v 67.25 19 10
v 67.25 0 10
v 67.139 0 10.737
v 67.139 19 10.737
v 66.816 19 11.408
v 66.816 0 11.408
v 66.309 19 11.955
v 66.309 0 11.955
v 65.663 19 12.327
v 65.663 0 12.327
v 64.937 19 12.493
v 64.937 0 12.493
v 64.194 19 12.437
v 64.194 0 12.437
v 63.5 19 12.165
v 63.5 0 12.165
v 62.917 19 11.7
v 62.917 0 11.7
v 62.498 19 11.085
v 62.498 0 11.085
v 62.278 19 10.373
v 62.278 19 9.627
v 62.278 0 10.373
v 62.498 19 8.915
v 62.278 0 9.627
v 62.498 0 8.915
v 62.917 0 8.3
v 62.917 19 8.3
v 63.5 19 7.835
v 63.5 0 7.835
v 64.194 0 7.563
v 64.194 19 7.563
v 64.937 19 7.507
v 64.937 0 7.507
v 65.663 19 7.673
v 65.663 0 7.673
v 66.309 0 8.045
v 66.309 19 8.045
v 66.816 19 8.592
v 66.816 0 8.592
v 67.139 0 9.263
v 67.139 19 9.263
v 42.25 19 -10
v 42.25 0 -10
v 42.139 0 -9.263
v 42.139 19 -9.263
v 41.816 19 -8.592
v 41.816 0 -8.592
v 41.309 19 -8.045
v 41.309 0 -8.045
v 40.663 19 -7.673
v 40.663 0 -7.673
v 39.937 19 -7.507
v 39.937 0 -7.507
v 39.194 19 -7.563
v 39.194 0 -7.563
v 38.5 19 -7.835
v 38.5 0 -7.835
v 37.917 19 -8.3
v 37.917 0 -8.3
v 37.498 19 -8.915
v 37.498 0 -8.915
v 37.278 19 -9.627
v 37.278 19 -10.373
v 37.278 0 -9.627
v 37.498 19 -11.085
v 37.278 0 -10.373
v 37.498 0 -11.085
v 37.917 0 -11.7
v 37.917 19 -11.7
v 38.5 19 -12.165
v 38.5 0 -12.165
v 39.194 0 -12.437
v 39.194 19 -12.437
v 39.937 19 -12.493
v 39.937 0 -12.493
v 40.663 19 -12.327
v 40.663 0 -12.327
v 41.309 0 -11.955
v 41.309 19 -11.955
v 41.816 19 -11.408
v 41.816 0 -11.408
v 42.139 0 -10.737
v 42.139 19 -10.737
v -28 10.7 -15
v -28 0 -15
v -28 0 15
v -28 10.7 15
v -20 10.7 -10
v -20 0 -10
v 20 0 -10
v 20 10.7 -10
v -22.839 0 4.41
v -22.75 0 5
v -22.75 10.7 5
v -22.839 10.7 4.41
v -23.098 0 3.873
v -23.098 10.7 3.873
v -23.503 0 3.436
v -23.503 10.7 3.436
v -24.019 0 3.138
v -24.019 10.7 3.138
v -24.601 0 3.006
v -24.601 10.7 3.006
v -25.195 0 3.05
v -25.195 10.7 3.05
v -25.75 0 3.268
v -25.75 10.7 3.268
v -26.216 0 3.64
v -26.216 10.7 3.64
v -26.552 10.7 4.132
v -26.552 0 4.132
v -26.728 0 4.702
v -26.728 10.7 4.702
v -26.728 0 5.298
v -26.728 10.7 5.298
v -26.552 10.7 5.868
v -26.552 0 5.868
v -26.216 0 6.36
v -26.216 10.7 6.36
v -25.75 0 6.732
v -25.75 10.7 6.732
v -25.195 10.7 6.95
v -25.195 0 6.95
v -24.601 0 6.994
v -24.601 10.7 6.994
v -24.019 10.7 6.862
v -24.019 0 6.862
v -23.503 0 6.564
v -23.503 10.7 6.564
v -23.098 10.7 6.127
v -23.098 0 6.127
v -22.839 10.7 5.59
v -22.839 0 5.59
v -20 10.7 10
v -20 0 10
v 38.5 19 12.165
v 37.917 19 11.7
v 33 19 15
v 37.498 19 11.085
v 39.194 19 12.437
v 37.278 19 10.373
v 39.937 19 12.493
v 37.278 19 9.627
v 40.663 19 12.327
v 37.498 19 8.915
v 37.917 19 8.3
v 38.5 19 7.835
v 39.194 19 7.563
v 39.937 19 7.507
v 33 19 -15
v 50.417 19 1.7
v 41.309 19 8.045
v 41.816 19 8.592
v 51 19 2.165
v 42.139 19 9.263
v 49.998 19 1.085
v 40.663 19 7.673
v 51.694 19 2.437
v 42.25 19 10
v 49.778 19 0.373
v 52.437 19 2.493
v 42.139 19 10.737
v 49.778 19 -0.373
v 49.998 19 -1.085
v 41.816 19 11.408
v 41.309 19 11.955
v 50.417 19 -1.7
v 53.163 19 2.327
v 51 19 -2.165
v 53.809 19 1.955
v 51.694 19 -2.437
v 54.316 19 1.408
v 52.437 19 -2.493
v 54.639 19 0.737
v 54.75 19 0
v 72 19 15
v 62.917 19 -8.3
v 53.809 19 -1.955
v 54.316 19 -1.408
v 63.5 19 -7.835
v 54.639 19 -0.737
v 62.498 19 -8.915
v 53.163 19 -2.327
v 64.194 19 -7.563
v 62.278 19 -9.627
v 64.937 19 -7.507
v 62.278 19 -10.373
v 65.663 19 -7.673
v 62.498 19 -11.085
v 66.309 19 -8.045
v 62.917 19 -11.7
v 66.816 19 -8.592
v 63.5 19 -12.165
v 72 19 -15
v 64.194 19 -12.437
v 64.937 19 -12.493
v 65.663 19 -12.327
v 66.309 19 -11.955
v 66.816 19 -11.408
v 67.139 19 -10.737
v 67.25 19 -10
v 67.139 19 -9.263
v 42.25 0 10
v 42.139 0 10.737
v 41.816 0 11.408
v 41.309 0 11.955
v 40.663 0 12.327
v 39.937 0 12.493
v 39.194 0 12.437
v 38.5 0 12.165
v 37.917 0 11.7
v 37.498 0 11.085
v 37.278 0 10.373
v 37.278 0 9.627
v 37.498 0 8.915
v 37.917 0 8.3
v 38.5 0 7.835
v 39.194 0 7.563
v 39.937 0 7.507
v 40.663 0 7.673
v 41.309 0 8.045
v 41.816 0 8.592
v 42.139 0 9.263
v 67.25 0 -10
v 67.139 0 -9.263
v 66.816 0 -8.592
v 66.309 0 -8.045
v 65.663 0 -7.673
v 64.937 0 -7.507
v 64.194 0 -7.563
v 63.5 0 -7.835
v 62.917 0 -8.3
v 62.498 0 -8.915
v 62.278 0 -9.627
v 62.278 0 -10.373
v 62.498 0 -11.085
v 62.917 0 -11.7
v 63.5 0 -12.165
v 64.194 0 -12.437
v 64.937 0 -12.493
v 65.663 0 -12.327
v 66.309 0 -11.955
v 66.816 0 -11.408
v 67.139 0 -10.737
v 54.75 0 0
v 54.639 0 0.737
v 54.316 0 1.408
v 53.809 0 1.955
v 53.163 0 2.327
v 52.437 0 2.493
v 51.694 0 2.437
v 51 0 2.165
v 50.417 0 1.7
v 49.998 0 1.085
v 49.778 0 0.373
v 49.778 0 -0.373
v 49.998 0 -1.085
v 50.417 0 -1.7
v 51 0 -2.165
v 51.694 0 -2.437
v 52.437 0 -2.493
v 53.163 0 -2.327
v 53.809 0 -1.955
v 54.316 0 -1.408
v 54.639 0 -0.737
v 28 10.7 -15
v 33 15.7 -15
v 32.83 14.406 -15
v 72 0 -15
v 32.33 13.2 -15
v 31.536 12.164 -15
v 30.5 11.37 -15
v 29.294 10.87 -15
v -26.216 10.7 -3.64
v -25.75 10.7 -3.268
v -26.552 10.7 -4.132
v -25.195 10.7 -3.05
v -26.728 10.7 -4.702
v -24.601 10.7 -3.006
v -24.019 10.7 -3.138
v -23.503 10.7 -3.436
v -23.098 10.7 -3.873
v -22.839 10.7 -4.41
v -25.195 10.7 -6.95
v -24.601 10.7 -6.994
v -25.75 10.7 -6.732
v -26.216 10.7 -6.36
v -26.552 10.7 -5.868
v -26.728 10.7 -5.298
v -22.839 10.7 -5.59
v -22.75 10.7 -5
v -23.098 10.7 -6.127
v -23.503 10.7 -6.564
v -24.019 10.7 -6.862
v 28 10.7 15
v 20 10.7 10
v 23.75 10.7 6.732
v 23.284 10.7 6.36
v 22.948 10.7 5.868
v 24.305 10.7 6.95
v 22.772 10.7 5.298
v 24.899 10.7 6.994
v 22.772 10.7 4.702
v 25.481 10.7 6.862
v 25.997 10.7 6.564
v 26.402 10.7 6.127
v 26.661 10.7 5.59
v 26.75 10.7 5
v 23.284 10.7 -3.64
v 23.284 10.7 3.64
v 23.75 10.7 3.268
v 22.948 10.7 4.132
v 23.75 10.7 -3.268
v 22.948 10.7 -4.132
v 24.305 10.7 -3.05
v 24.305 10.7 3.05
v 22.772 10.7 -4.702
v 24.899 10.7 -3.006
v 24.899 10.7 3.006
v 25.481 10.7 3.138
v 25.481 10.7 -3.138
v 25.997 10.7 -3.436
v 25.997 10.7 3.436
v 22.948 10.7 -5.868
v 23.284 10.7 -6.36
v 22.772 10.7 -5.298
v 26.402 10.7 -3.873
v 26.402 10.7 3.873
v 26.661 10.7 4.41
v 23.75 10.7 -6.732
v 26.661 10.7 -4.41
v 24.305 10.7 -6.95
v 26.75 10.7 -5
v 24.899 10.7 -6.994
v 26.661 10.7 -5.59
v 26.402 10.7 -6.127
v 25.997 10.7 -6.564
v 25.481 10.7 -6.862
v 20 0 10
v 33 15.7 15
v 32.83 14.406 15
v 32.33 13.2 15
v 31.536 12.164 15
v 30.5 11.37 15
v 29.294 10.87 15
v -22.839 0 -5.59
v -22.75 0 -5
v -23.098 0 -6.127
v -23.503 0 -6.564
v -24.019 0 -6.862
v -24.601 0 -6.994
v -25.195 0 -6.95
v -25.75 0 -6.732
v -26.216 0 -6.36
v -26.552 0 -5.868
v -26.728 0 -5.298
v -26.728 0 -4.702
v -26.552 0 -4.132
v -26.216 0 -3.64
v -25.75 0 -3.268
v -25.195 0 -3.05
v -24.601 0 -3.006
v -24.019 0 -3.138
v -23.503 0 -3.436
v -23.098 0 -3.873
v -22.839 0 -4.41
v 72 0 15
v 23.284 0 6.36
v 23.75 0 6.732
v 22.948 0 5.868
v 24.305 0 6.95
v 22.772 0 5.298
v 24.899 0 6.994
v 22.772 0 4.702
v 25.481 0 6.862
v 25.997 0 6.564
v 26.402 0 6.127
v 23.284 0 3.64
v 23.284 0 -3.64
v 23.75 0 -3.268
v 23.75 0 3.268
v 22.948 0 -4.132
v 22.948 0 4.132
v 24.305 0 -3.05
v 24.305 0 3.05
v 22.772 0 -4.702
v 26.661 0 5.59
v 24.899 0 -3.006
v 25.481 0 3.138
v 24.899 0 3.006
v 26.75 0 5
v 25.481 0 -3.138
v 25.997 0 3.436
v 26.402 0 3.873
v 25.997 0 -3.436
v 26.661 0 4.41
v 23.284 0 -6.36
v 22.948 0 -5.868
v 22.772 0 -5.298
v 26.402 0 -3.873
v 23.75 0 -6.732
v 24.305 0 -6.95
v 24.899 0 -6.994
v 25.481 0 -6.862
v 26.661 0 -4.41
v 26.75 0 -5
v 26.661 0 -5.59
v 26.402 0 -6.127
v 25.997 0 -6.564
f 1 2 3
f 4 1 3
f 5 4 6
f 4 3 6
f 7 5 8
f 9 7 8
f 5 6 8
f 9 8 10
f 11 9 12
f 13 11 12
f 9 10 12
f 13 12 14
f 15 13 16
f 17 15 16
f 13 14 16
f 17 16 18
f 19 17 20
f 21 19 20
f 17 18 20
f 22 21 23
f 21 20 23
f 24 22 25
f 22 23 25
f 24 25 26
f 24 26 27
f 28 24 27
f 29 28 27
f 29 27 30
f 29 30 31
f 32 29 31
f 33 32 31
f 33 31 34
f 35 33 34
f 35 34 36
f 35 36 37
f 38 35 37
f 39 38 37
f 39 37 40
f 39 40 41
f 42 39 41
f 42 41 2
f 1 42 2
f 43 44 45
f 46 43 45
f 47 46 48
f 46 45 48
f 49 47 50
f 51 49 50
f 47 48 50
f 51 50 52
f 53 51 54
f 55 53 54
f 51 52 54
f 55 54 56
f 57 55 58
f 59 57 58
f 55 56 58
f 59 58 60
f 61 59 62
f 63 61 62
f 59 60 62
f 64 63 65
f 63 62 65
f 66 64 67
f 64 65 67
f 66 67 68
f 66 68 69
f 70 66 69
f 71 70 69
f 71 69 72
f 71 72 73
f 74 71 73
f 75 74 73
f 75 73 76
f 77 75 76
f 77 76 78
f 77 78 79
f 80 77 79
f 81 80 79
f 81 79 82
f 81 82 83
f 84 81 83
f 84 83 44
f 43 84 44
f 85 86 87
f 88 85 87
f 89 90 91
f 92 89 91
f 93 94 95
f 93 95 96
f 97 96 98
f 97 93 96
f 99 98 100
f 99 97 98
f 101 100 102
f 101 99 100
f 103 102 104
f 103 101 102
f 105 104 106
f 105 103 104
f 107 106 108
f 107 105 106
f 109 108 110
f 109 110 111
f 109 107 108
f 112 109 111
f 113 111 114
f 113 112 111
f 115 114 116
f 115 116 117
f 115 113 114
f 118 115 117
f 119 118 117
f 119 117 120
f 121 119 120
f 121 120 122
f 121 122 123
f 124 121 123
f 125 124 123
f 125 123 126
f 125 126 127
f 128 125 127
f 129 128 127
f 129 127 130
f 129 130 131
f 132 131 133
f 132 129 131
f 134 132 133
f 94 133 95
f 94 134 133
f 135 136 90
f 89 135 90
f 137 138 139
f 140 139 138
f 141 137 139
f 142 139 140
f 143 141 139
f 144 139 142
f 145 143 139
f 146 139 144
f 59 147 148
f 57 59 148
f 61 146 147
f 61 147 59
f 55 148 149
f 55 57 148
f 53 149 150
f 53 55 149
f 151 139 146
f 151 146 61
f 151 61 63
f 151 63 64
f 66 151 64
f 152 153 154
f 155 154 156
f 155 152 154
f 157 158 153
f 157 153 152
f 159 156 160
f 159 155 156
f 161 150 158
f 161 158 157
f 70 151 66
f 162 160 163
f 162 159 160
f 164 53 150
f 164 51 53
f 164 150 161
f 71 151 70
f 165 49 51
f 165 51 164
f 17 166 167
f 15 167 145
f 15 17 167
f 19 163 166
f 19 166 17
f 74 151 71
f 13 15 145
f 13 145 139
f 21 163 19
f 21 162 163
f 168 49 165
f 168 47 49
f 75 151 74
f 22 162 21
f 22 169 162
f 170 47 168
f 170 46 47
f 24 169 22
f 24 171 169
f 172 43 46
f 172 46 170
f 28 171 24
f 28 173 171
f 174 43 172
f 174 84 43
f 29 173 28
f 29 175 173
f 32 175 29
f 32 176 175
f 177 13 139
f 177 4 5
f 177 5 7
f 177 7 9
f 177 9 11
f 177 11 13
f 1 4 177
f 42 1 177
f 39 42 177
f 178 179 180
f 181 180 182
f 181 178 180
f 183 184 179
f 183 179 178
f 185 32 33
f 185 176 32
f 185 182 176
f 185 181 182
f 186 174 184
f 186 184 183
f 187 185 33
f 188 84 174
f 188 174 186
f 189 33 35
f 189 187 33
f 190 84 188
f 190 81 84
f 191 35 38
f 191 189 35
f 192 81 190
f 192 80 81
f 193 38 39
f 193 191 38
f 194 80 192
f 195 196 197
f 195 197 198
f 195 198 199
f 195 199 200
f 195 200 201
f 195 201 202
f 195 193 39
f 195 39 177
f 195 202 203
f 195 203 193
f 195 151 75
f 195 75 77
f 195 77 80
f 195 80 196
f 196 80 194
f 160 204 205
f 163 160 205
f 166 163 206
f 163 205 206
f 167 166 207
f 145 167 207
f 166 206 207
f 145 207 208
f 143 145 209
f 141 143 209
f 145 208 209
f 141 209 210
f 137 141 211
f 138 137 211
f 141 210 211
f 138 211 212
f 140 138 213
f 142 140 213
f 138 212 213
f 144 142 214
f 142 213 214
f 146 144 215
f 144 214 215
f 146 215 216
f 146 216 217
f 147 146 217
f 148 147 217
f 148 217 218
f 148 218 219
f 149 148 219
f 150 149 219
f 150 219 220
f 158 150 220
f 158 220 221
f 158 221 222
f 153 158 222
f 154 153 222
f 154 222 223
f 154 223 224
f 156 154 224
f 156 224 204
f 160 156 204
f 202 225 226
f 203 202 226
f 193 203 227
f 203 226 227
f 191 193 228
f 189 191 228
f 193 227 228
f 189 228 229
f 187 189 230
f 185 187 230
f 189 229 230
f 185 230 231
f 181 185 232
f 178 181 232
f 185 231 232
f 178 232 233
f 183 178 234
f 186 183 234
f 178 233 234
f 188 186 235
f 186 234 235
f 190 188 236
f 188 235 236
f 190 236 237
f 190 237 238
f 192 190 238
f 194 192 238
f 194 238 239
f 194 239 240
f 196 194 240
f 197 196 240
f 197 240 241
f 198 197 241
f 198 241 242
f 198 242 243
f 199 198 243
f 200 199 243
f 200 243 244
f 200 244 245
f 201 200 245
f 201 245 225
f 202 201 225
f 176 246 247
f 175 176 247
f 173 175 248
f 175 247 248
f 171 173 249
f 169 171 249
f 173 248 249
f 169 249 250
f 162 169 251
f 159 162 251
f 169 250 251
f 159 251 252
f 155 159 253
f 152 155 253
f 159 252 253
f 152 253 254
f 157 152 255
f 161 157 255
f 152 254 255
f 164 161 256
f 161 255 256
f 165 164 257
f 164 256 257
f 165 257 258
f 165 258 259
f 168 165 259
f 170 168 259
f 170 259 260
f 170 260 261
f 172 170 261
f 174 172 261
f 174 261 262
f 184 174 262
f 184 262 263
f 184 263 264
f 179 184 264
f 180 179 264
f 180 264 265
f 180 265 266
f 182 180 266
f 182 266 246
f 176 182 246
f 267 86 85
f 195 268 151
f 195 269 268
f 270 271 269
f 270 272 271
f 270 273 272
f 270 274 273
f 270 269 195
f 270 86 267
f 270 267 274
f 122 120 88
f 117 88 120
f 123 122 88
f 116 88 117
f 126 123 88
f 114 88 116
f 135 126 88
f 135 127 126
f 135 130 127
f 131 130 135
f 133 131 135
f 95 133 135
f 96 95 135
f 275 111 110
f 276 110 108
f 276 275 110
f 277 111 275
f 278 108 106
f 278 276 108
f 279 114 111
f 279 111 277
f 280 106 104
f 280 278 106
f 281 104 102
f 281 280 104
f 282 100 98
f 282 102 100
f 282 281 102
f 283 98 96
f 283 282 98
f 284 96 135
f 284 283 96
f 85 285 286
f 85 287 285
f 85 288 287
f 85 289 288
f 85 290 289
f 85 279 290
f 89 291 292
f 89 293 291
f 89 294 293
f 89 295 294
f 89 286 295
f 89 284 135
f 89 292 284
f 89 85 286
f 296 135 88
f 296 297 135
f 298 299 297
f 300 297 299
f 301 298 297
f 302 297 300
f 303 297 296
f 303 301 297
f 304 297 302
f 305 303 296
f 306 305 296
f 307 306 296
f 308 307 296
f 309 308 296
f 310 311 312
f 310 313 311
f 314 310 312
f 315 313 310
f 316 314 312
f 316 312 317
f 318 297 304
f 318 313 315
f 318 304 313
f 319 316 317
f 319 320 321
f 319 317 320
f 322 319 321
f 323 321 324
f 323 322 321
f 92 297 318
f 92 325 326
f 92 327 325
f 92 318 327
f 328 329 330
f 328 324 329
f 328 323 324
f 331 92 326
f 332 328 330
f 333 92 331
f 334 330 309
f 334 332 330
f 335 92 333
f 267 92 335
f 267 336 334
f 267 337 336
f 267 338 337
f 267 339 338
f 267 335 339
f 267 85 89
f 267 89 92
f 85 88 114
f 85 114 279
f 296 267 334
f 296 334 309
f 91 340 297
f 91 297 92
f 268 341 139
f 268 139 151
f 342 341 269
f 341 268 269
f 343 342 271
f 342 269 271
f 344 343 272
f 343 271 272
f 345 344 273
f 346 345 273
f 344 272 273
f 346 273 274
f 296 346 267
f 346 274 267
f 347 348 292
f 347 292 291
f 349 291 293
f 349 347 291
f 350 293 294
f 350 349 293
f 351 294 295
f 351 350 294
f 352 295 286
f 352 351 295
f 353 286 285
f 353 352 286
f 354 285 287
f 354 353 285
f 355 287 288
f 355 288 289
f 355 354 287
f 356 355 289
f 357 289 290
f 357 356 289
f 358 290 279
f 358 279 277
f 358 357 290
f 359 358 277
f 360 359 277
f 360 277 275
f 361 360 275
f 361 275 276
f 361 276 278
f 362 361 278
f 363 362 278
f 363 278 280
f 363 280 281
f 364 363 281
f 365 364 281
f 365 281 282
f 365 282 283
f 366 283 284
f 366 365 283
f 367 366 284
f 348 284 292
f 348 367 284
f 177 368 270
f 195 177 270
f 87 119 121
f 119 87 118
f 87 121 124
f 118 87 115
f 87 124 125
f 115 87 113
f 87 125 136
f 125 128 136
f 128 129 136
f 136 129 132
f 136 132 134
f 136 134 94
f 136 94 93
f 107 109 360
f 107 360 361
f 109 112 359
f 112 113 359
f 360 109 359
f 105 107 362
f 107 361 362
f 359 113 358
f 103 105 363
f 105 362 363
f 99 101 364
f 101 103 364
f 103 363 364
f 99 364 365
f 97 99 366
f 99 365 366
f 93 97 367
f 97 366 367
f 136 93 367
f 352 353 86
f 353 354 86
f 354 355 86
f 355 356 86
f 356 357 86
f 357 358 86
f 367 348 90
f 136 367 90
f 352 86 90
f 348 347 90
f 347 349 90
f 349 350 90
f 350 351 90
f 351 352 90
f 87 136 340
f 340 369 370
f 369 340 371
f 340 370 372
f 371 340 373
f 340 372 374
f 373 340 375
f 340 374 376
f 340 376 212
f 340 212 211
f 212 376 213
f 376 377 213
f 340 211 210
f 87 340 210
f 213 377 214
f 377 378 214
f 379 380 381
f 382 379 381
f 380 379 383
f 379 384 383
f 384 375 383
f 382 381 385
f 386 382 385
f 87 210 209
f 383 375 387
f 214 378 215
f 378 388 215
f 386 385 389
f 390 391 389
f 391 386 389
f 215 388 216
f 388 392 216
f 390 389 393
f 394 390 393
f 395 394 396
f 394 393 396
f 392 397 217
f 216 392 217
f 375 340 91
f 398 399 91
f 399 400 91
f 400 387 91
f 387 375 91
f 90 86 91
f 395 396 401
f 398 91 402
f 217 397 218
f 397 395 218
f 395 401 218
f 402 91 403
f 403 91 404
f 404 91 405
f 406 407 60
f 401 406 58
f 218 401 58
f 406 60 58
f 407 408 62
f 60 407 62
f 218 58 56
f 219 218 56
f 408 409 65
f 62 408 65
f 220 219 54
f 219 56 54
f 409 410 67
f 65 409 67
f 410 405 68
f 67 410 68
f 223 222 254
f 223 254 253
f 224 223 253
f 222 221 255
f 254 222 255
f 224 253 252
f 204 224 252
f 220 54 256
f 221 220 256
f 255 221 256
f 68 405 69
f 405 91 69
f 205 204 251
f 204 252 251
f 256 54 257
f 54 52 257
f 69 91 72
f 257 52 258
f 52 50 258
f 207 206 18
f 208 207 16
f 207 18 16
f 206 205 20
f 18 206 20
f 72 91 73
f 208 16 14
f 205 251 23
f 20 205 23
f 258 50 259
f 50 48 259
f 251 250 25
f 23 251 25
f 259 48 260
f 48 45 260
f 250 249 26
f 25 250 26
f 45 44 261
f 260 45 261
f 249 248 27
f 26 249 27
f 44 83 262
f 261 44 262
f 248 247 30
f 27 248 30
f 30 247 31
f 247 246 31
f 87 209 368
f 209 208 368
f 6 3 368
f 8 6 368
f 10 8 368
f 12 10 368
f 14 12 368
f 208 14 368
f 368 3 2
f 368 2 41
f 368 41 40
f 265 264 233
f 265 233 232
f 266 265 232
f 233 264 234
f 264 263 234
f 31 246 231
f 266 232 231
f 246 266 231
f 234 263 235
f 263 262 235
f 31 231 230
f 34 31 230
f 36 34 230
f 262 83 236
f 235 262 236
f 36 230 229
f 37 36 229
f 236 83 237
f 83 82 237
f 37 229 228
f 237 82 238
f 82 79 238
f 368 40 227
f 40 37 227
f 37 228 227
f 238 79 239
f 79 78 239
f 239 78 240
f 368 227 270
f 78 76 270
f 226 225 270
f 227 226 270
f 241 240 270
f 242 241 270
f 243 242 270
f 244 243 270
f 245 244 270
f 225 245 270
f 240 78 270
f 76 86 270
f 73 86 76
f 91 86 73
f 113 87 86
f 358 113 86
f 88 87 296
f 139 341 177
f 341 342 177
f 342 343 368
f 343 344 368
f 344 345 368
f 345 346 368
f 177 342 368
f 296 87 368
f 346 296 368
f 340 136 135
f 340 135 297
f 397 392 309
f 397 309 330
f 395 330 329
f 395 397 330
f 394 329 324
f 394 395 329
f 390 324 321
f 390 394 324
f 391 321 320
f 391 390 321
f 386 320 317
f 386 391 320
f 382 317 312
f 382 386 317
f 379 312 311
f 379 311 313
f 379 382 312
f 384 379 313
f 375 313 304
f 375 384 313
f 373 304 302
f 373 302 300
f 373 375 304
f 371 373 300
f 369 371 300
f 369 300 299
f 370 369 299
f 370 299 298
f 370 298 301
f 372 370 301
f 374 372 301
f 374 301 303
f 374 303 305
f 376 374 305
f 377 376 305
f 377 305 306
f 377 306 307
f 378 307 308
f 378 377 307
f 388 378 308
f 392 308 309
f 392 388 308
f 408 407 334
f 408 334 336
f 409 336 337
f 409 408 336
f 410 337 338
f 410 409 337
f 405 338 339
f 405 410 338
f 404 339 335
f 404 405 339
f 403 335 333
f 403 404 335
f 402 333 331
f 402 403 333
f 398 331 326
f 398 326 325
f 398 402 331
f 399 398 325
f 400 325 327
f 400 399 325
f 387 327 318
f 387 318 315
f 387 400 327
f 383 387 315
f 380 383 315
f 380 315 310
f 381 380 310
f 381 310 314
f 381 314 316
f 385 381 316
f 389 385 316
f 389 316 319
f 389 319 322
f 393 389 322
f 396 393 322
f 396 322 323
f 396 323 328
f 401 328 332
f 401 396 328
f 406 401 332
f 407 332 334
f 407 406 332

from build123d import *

# Parameters (mm, degrees)
SKETCH1_R           = 2
SKETCH1_W           = 40
SKETCH1_H           = 20
BOSS_EXTRUDE1_DEPTH = 10.7
SKETCH1_4_W         = 39
SKETCH1_4_H         = 30
BOSS_EXTRUDE2_DEPTH = 19
FILLET1_R           = 5
CUT_EXTRUDE2_REACH  = 21
SKETCH2_R           = 2.5


with BuildPart() as part:
    # Sketch1 → Boss-Extrude1 (new body)
    with BuildSketch(Plane(origin=(0, 0, 0), x_dir=(1, 0, 0), z_dir=(0, 1, 0))):
        Polygon((28, 15), (0, 15), (-28, 15), (-28, 0), (-28, -15), (0, -15), (33, -15), (33, 15), align=None)
        with Locations((-24.75, -5)):
            Circle(SKETCH1_R, mode=Mode.SUBTRACT)
        Rectangle(SKETCH1_W, SKETCH1_H, mode=Mode.SUBTRACT)
        with Locations((24.75, -5)):
            Circle(SKETCH1_R, mode=Mode.SUBTRACT)
        with Locations((-24.75, 5)):
            Circle(SKETCH1_R, mode=Mode.SUBTRACT)
        with Locations((24.75, 5)):
            Circle(SKETCH1_R, mode=Mode.SUBTRACT)
    extrude(amount=BOSS_EXTRUDE1_DEPTH)

    # Sketch1<4> → Boss-Extrude2 (add)
    with BuildSketch(Plane(origin=(0, 0, 0), x_dir=(1, 0, 0), z_dir=(0, 1, 0))):
        with Locations((52.5, 0)):
            Rectangle(SKETCH1_4_W, SKETCH1_4_H)
    extrude(amount=BOSS_EXTRUDE2_DEPTH)

    # Fillet1
    fillet1_edges = [part.edges().sort_by_distance(p)[0] for p in [
        (33, 10.7, 0),
    ]]
    fillet(fillet1_edges, radius=FILLET1_R)

    # Sketch2 → Cut-Extrude2 (cut, up to next)
    with BuildSketch(Plane.XZ, mode=Mode.PRIVATE) as cut_extrude2_sk1:
        with Locations((52.25, 0)):
            Circle(SKETCH2_R)
    cut_extrude2_tool1 = extrude(cut_extrude2_sk1.sketch, amount=-CUT_EXTRUDE2_REACH, mode=Mode.PRIVATE) & part.part
    add(cut_extrude2_tool1.solids().sort_by_distance((52.25, 0, 0))[0], mode=Mode.SUBTRACT)
    # Sketch2 → Cut-Extrude2 (cut, up to next)
    with BuildSketch(Plane.XZ, mode=Mode.PRIVATE) as cut_extrude2_sk2:
        with Locations((39.75, 10)):
            Circle(SKETCH2_R)
    cut_extrude2_tool2 = extrude(cut_extrude2_sk2.sketch, amount=-CUT_EXTRUDE2_REACH, mode=Mode.PRIVATE) & part.part
    add(cut_extrude2_tool2.solids().sort_by_distance((39.75, 0, 10))[0], mode=Mode.SUBTRACT)
    # Sketch2 → Cut-Extrude2 (cut, up to next)
    with BuildSketch(Plane.XZ, mode=Mode.PRIVATE) as cut_extrude2_sk3:
        with Locations((39.75, -10)):
            Circle(SKETCH2_R)
    cut_extrude2_tool3 = extrude(cut_extrude2_sk3.sketch, amount=-CUT_EXTRUDE2_REACH, mode=Mode.PRIVATE) & part.part
    add(cut_extrude2_tool3.solids().sort_by_distance((39.75, 0, -10))[0], mode=Mode.SUBTRACT)
    # Sketch2 → Cut-Extrude2 (cut, up to next)
    with BuildSketch(Plane.XZ, mode=Mode.PRIVATE) as cut_extrude2_sk4:
        with Locations((64.75, -10)):
            Circle(SKETCH2_R)
    cut_extrude2_tool4 = extrude(cut_extrude2_sk4.sketch, amount=-CUT_EXTRUDE2_REACH, mode=Mode.PRIVATE) & part.part
    add(cut_extrude2_tool4.solids().sort_by_distance((64.75, 0, -10))[0], mode=Mode.SUBTRACT)
    # Sketch2 → Cut-Extrude2 (cut, up to next)
    with BuildSketch(Plane.XZ, mode=Mode.PRIVATE) as cut_extrude2_sk5:
        with Locations((64.75, 10)):
            Circle(SKETCH2_R)
    cut_extrude2_tool5 = extrude(cut_extrude2_sk5.sketch, amount=-CUT_EXTRUDE2_REACH, mode=Mode.PRIVATE) & part.part
    add(cut_extrude2_tool5.solids().sort_by_distance((64.75, 0, 10))[0], mode=Mode.SUBTRACT)


solid = part.part
